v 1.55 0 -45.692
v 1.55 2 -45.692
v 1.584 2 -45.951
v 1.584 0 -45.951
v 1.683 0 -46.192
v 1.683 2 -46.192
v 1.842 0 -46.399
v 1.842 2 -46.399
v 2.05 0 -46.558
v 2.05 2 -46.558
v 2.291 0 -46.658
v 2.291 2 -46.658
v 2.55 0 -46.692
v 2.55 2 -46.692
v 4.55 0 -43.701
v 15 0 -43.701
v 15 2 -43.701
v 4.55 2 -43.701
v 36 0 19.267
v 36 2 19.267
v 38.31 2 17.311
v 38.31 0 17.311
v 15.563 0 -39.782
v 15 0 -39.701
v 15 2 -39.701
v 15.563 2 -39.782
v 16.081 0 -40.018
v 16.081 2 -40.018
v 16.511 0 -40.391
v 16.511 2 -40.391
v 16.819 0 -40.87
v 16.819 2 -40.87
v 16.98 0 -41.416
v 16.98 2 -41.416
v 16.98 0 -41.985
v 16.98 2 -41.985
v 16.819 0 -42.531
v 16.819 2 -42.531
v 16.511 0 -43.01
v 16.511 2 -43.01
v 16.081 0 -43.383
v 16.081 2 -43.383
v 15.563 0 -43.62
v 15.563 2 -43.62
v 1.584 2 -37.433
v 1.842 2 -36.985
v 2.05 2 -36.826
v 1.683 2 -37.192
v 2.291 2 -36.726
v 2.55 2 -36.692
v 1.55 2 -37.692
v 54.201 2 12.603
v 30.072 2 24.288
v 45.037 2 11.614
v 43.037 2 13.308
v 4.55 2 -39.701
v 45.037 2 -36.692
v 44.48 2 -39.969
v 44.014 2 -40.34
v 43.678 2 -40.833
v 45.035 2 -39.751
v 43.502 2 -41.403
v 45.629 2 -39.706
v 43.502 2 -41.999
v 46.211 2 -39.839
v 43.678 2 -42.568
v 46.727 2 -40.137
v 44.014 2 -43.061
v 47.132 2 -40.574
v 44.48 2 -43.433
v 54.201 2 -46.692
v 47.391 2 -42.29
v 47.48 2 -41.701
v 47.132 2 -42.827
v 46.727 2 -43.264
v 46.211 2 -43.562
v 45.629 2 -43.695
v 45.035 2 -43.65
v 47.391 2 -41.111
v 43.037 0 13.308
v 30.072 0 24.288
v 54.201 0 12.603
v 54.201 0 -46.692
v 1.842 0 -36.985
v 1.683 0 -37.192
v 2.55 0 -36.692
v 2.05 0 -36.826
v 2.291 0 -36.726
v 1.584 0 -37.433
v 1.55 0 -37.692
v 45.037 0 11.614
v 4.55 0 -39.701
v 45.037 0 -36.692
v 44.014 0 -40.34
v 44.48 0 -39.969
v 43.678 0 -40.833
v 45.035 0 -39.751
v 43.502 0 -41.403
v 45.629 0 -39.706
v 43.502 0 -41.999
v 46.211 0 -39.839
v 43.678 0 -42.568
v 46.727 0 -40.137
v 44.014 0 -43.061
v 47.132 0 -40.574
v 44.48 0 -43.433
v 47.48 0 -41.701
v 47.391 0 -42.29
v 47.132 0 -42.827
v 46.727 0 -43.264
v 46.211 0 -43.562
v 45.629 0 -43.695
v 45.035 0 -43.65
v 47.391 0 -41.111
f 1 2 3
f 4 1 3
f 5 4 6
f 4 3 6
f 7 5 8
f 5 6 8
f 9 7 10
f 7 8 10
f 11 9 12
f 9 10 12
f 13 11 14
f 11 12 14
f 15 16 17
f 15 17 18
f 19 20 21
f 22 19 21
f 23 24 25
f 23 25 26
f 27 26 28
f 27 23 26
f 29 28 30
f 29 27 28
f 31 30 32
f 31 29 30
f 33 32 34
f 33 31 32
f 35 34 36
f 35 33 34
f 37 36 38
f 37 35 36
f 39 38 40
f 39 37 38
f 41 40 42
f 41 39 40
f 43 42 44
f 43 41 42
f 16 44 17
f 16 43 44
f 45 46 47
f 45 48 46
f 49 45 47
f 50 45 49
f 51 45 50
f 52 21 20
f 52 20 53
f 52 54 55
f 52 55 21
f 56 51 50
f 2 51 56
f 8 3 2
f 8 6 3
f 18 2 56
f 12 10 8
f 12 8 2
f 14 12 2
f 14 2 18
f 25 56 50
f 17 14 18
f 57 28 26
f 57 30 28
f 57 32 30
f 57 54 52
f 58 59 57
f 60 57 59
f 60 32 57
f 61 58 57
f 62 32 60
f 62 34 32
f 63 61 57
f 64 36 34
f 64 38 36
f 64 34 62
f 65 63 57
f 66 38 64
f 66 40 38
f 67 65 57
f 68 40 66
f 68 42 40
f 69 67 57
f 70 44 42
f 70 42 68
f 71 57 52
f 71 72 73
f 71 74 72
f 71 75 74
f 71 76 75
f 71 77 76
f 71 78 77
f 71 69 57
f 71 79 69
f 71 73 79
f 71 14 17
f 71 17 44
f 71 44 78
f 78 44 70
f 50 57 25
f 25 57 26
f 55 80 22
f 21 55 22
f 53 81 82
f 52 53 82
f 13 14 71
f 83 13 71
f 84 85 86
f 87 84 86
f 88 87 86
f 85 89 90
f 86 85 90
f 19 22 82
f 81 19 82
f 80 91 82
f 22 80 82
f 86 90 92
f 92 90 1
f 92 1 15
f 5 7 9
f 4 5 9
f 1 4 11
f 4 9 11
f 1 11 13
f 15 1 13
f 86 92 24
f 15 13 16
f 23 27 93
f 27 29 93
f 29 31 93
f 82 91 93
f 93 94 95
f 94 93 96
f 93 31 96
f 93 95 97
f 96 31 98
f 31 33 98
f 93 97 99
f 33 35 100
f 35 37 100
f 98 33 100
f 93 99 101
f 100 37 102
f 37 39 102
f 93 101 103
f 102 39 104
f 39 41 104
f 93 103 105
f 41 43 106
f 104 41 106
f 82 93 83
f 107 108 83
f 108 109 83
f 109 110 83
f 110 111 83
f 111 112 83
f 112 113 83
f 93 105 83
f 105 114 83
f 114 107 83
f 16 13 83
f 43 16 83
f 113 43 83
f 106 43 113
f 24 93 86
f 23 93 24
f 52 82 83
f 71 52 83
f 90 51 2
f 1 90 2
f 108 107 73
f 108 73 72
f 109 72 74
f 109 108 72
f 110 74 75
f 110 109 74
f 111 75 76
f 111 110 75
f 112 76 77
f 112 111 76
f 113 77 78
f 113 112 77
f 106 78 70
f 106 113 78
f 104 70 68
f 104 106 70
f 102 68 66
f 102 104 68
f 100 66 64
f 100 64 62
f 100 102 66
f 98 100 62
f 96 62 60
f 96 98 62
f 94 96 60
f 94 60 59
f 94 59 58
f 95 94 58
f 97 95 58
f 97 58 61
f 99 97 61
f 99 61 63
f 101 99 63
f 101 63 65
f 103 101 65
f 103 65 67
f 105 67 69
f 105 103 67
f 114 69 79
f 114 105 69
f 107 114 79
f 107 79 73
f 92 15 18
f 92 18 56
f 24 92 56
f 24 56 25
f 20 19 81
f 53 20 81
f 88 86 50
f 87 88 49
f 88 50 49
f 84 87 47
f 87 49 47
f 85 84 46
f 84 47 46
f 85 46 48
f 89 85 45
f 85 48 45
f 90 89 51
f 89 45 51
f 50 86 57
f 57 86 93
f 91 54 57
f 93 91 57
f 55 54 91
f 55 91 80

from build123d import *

# Parameters (mm, degrees)
SKETCH1_R           = 2
BOSS_EXTRUDE2_DEPTH = 2
CUT_EXTRUDE2_DEPTH  = 9
CUT_EXTRUDE3_DEPTH  = 9
CUT_EXTRUDE4_DEPTH  = 10
CUT_EXTRUDE5_DEPTH  = 10
CUT_EXTRUDE6_DEPTH  = 10
CUT_EXTRUDE8_DEPTH  = 20


with BuildPart() as part:
    # Sketch1 → Boss-Extrude2 (new body)
    with BuildSketch(Plane(origin=(0, 0, 0), x_dir=(1, 0, 0), z_dir=(0, 1, 0))):
        with BuildLine():
            Line((0, 48.412862342), (0, 37.692030173))
            ThreePointArc((0, 37.692030173), (0.292893219, 36.984923392), (1, 36.692030173))
            Line((1, 36.692030173), (31.48, 36.692030173))
            Line((31.48, 36.692030173), (43.036527631, 36.692030173))
            Line((43.036527631, 36.692030173), (43.036527631, -13.307969827))
            Line((43.036527631, -13.307969827), (38.310297741, -17.310739702))
            Line((38.310297741, -17.310739702), (34.253582629, -17.310739702))
            Line((34.253582629, -17.310739702), (36, -19.267392345))
            Line((36, -19.267392345), (30.071702425, -24.288225334))
            Line((30.071702425, -24.288225334), (54.200832168, -12.602889922))
            Line((54.200832168, -12.602889922), (54.200832168, 10.267562985))
            Line((54.200832168, 10.267562985), (54.200832168, 49.412862342))
            Line((54.200832168, 49.412862342), (41.48, 49.412862342))
            Line((41.48, 49.412862342), (1, 49.412862342))
            ThreePointArc((1, 49.412862342), (0.292893219, 49.119969123), (0, 48.412862342))
        make_face()
        with Locations((45.48, 41.700609081)):
            Circle(SKETCH1_R, mode=Mode.SUBTRACT)
        with BuildLine():
            Line((15, 43.700609081), (4.549516448, 43.700609081))
            Line((4.549516448, 43.700609081), (4.549516448, 39.700609081))
            Line((4.549516448, 39.700609081), (15, 39.700609081))
            ThreePointArc((15, 39.700609081), (17, 41.700609081), (15, 43.700609081))
        make_face(mode=Mode.SUBTRACT)
    extrude(amount=BOSS_EXTRUDE2_DEPTH)

    # Sketch6 → Cut-Extrude2 (cut)
    with BuildSketch(Plane(origin=(0, 2, 0), x_dir=(1, 0, 0), z_dir=(0, 1, 0))):
        Polygon((36, -19.267392345), (38.310297741, -17.310739702), (34.253582629, -17.310739702), align=None)
    extrude(amount=-CUT_EXTRUDE2_DEPTH, mode=Mode.SUBTRACT)

    # Sketch8 → Cut-Extrude3 (cut)
    with BuildSketch(Plane(origin=(0, 2, 0), x_dir=(1, 0, 0), z_dir=(0, 1, 0))):
        Polygon((43.036527631, 36.692030173), (45.036527631, 36.692030173), (45.036527631, -11.115496155), (45.036527631, -11.614116599), (43.036527631, -13.307969827), align=None)
    extrude(amount=-CUT_EXTRUDE3_DEPTH, mode=Mode.SUBTRACT)

    # Sketch9 → Cut-Extrude4 (cut)
    with BuildSketch(Plane(origin=(0, 2, 0), x_dir=(1, 0, 0), z_dir=(0, 1, 0))):
        with BuildLine():
            Line((0, 46.692030173), (54.200832168, 46.692030173))
            Line((54.200832168, 46.692030173), (54.200832168, 49.412862342))
            Line((54.200832168, 49.412862342), (1, 49.412862342))
            ThreePointArc((1, 49.412862342), (0.292893219, 49.119969123), (0, 48.412862342))
            Line((0, 48.412862342), (0, 46.692030173))
        make_face()
    extrude(amount=-CUT_EXTRUDE4_DEPTH, mode=Mode.SUBTRACT)

    # Sketch11 → Cut-Extrude5 (cut)
    with BuildSketch(Plane(origin=(0, 2, 0), x_dir=(1, 0, 0), z_dir=(0, 1, 0))):
        with BuildLine():
            Line((1, 46.692030173), (0, 46.692030173))
            Line((0, 46.692030173), (0, 45.692030173))
            ThreePointArc((0, 45.692030173), (0.292893219, 46.399136955), (1, 46.692030173))
        make_face()
    extrude(amount=-CUT_EXTRUDE5_DEPTH, mode=Mode.SUBTRACT)

    # Sketch12 → Cut-Extrude6 (cut)
    with BuildSketch(Plane(origin=(0, 2, 0), x_dir=(1, 0, 0), z_dir=(0, 1, 0))):
        with BuildLine():
            Line((1.549516448, 36.692030173), (1.549516448, 41.700609081))
            Line((1.549516448, 41.700609081), (1.549516448, 46.692030173))
            Line((1.549516448, 46.692030173), (1, 46.692030173))
            ThreePointArc((1, 46.692030173), (0.292893219, 46.399136955), (0, 45.692030173))
            Line((0, 45.692030173), (0, 37.692030173))
            ThreePointArc((0, 37.692030173), (0.292893219, 36.984923392), (1, 36.692030173))
            Line((1, 36.692030173), (1.549516448, 36.692030173))
        make_face()
    extrude(amount=-CUT_EXTRUDE6_DEPTH, mode=Mode.SUBTRACT)

    # Sketch13 → Cut-Extrude8 (cut)
    with BuildSketch(Plane(origin=(0, 2, 0), x_dir=(1, 0, 0), z_dir=(0, 1, 0))):
        with BuildLine():
            ThreePointArc((2.549516448, 36.692030173), (1.842409666, 36.984923392), (1.549516448, 37.692030173))
            Line((1.549516448, 37.692030173), (1.549516448, 36.692030173))
            Line((1.549516448, 36.692030173), (2.549516448, 36.692030173))
        make_face()
        with BuildLine():
            Line((2.549516448, 46.692030173), (1.549516448, 46.692030173))
            Line((1.549516448, 46.692030173), (1.549516448, 45.692030173))
            ThreePointArc((1.549516448, 45.692030173), (1.842409666, 46.399136955), (2.549516448, 46.692030173))
        make_face()
    extrude(amount=-CUT_EXTRUDE8_DEPTH, mode=Mode.SUBTRACT)


solid = part.part
